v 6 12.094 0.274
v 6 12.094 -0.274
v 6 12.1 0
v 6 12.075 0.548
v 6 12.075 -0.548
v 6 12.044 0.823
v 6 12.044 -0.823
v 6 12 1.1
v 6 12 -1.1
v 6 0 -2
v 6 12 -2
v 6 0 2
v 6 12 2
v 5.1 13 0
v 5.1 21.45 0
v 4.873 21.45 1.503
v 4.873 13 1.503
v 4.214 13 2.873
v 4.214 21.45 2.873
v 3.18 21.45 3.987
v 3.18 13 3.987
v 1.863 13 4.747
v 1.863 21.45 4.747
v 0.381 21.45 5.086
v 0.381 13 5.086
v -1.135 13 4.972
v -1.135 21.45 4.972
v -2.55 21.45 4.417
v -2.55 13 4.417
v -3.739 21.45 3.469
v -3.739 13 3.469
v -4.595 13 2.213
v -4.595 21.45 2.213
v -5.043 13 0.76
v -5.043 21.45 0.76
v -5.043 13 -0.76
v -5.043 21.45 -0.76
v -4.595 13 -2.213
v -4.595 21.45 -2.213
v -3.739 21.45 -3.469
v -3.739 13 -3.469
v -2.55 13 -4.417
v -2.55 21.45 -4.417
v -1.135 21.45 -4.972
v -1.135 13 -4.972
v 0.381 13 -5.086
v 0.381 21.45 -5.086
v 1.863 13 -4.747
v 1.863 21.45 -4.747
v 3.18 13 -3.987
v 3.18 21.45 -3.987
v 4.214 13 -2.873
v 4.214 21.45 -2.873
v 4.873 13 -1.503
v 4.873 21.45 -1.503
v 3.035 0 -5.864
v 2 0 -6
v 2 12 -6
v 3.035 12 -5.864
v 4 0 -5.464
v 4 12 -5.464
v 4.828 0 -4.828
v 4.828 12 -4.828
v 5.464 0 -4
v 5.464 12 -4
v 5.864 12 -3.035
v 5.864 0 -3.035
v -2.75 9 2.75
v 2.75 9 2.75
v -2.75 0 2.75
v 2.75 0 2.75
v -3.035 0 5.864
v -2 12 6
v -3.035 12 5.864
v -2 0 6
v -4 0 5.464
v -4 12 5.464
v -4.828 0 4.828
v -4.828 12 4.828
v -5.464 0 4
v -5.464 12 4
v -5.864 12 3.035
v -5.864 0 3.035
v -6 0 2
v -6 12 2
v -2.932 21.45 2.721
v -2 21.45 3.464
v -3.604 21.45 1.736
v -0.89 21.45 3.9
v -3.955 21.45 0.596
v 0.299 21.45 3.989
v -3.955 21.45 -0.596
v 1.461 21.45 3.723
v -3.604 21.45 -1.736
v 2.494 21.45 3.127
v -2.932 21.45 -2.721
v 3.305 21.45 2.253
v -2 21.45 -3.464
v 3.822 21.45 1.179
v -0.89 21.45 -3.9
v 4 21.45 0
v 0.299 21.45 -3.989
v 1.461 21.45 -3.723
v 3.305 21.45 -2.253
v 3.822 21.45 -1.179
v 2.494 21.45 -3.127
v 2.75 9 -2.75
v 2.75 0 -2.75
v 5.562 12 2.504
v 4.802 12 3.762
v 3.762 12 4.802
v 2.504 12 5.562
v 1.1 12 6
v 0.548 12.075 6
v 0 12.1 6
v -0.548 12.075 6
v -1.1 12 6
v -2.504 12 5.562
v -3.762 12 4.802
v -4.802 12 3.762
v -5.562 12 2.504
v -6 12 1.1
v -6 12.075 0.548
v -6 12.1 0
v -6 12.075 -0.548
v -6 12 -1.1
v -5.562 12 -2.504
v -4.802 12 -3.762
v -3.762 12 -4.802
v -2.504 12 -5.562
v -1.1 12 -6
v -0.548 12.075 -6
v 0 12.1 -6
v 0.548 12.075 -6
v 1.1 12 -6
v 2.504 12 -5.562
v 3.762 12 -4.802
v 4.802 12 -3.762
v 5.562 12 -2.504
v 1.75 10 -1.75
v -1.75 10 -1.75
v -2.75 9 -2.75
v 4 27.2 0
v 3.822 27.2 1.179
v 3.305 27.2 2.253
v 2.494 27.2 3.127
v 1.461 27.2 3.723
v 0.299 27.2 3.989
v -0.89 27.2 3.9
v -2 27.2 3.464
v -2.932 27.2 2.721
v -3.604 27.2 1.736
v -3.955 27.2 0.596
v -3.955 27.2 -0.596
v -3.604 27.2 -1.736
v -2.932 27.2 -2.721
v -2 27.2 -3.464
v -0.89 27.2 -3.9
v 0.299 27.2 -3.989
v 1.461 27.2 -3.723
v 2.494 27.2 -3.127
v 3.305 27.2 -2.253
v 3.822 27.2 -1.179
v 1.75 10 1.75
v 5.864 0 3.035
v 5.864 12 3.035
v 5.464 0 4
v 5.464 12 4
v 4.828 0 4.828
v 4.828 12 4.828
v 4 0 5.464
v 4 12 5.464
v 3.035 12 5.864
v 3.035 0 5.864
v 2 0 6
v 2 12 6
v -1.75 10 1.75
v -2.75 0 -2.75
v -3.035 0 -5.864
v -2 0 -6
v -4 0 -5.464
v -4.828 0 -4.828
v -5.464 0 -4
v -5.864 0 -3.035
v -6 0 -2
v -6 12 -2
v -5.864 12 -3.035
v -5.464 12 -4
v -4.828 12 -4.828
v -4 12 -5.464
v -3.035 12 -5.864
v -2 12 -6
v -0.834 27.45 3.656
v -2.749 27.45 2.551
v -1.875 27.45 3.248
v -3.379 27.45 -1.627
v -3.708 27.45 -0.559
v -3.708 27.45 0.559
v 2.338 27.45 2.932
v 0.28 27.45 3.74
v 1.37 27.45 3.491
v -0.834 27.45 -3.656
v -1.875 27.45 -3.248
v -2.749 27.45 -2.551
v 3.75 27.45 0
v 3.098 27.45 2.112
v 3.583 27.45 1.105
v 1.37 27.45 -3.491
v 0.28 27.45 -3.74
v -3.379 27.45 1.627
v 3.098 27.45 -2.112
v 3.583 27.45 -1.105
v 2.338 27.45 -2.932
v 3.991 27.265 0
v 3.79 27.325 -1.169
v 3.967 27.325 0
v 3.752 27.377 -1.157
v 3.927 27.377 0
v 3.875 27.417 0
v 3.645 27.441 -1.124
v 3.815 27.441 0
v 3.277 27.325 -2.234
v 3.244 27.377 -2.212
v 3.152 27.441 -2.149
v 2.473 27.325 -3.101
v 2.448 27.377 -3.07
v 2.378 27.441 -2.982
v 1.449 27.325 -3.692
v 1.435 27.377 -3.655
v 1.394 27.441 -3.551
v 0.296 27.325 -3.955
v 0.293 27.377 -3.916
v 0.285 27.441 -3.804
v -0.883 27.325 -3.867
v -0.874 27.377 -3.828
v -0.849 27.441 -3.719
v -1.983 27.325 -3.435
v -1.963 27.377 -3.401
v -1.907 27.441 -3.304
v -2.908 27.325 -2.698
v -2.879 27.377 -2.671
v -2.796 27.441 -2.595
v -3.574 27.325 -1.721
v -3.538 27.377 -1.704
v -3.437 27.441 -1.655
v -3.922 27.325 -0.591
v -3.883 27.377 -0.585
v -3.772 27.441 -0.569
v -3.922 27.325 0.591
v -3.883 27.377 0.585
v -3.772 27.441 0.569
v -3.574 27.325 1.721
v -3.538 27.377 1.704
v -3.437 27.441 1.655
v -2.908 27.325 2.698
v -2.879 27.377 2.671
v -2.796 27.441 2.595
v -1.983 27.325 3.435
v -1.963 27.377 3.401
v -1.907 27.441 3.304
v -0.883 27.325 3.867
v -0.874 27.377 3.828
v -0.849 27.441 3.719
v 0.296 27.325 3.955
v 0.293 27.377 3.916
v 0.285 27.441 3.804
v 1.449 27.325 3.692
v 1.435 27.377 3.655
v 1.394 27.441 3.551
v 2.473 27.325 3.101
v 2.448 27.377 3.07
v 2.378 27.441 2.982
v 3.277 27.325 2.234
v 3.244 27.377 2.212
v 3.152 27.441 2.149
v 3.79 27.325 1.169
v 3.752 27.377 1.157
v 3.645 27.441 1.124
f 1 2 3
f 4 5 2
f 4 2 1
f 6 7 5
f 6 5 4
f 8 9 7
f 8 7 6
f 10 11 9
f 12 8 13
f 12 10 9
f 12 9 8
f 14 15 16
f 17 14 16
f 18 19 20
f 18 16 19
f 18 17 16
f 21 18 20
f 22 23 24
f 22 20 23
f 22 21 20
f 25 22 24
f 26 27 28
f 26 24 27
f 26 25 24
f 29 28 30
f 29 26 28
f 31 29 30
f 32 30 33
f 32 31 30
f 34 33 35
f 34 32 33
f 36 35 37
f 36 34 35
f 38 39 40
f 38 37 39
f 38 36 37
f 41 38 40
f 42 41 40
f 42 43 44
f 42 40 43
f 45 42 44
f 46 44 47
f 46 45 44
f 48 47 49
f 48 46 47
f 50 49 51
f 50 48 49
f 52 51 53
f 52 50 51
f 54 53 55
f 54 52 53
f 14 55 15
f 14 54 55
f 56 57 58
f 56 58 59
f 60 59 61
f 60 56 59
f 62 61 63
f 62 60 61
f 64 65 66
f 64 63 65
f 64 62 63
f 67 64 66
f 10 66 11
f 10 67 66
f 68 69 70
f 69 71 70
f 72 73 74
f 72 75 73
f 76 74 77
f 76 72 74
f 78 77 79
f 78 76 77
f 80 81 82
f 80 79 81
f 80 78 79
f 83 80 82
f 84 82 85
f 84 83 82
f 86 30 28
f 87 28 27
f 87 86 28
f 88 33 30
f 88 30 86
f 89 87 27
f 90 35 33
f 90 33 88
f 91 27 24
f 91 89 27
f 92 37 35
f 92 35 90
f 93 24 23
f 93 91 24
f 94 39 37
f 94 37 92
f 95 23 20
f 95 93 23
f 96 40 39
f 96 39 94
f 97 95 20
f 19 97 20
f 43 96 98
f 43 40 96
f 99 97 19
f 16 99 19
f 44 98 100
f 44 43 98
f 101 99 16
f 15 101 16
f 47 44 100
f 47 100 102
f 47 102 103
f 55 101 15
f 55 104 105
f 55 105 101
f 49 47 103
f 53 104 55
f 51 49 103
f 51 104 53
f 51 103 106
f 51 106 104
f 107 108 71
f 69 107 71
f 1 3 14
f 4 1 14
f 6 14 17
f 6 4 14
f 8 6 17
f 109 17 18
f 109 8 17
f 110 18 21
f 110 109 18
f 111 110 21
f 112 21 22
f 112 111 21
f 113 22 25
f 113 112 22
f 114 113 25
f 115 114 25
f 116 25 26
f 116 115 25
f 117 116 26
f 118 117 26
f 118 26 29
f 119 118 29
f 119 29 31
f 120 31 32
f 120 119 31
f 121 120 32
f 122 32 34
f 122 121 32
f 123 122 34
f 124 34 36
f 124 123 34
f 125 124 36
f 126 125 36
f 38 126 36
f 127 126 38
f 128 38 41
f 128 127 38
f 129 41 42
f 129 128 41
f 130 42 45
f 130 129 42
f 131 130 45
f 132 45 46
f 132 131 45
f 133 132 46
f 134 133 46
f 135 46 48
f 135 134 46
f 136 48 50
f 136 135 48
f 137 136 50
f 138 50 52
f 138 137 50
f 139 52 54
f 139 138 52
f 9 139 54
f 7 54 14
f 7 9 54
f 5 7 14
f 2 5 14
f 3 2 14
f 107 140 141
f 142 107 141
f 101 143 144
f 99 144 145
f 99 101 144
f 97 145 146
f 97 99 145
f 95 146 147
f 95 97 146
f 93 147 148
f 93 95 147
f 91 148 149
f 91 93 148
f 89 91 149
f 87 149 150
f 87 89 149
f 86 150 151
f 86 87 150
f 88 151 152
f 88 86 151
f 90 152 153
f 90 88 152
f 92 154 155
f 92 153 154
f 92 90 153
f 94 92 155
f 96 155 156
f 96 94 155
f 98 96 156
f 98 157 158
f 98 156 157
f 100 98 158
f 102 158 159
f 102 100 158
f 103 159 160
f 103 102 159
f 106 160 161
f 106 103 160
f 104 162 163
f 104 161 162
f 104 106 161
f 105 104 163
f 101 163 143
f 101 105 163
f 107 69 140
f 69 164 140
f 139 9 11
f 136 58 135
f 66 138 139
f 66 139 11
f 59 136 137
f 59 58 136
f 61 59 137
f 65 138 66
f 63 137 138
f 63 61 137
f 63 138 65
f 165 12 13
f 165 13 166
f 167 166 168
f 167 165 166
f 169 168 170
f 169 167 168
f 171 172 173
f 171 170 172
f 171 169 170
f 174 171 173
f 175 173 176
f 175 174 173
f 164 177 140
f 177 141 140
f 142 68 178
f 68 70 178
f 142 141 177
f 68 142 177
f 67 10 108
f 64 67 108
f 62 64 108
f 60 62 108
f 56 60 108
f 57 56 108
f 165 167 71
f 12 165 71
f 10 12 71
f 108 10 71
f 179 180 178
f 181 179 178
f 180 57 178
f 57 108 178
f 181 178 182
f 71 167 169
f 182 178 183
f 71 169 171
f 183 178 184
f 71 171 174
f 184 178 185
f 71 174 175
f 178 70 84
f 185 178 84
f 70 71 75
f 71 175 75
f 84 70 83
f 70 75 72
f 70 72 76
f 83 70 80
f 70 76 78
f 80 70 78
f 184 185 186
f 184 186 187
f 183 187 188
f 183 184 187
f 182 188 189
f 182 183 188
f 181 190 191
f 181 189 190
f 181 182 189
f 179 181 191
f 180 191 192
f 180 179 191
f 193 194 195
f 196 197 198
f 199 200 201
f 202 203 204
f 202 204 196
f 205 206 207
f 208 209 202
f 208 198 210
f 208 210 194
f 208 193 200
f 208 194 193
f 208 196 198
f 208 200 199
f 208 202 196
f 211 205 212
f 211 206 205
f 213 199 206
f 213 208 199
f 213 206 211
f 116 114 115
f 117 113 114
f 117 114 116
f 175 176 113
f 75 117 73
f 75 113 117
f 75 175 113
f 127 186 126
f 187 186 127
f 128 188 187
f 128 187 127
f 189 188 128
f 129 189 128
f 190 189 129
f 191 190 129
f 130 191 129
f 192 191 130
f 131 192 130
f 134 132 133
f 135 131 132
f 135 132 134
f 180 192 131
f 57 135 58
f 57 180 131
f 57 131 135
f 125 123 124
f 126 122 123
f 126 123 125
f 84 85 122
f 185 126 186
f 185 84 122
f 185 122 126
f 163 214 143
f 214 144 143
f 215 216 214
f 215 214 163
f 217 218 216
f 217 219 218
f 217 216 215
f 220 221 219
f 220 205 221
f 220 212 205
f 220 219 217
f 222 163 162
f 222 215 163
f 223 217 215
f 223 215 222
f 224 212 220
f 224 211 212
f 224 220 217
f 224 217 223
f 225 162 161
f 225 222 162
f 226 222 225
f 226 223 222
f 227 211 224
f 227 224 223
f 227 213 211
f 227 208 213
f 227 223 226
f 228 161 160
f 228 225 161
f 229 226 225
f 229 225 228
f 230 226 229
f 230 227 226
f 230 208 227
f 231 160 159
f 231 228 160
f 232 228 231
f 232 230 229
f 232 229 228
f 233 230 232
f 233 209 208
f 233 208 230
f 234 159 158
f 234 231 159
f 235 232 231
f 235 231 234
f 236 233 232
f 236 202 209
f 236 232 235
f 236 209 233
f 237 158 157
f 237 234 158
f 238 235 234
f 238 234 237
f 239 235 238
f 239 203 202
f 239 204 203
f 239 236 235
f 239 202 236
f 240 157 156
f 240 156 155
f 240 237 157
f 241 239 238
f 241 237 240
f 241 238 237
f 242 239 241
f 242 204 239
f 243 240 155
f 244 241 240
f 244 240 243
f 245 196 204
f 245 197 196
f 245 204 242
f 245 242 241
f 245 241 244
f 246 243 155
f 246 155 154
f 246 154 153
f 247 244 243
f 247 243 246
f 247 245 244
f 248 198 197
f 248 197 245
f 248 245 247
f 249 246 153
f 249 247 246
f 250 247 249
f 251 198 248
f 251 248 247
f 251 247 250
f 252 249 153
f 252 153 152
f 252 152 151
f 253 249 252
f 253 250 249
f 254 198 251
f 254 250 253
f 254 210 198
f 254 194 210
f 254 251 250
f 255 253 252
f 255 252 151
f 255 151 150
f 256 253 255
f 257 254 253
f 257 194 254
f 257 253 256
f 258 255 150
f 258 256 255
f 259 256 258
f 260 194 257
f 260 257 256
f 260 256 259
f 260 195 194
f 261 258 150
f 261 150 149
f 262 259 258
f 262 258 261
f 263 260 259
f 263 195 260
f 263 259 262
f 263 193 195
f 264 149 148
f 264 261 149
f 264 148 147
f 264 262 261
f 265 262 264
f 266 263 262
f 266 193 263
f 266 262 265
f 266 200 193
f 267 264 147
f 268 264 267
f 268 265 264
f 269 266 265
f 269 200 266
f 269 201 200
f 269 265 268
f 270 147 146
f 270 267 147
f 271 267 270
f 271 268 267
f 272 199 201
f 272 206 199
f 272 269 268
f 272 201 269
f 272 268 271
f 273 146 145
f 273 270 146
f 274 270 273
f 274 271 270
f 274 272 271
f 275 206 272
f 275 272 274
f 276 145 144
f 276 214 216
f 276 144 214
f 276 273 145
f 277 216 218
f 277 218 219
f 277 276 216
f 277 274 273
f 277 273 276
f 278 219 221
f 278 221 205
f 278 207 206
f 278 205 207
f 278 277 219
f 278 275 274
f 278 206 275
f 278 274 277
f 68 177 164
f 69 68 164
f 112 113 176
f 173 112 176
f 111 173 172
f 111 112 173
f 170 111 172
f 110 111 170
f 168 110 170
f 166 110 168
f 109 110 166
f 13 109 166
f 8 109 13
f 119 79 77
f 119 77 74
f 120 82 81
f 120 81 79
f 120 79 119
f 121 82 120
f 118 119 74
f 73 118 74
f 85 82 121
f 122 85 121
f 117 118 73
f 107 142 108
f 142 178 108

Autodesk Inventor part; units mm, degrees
ref_plane "YZ Plane" through (0, 0, 0) normal (1, 0, 0) x (0, 1, 0)
ref_plane "XZ Plane" through (0, 0, 0) normal (0, 1, 0) x (-1, 0, 0)
ref_plane "XY Plane" through (0, 0, 0) normal (0, 0, 1) x (1, 0, 0)
sketch "Szkic1" plane through (0, 0, 0) normal (0, 1, 0) x (-1, 0, 0)
  line L0 (-2.75, 2.75) -> (2.75, 2.75)
  line L1 (2.75, 2.75) -> (2.75, -2.75)
  line L2 (2.75, -2.75) -> (-2.75, -2.75)
  line L3 (-2.75, -2.75) -> (-2.75, 2.75)
  line L4 (-2.75, 2.75) -> (2.75, -2.75) construction
  line L5 (2.75, 2.75) -> (-2.75, -2.75) construction
  line L6 (-2, 6) -> (2, 6)
  line L7 (6, 2) -> (6, -2)
  line L8 (2, -6) -> (-2, -6)
  line L9 (-6, -2) -> (-6, 2)
  line L10 (-6, 6) -> (6, -6) construction
  line L11 (6, 6) -> (-6, -6) construction
  arc A0 (6, 2) -> (2, 6) centre (2, 2) ccw
  arc A1 (2, -6) -> (6, -2) centre (2, -2) ccw
  arc A2 (-6, -2) -> (-2, -6) centre (-2, -2) ccw
  arc A3 (-2, 6) -> (-6, 2) centre (-2, 2) ccw
  point P0 (0, 0)
  dimension "d0" = 5.5
  dimension "d1" = 12
  dimension "d2" = 4
extrude "Wyciągnięcie proste1" add sketch "Szkic1" along normal blind 10
sketch "Szkic2" plane through (0, 10, 0) normal (0, 1, 0) x (1, 0, 0)
  arc A0 (-6, -2) -> (-2, -6) centre (-2, -2) ccw projected
  line L0 (-6, 2) -> (-6, -2) projected
  arc A1 (-2, 6) -> (-6, 2) centre (-2, 2) ccw projected
  line L1 (2, 6) -> (-2, 6) projected
  arc A2 (6, 2) -> (2, 6) centre (2, 2) ccw projected
  line L2 (6, -2) -> (6, 2) projected
  arc A3 (2, -6) -> (6, -2) centre (2, -2) ccw projected
  line L3 (-2, -6) -> (2, -6) projected
extrude "Wyciągnięcie proste2" add sketch "Szkic2" along normal blind 2
sketch "Szkic3" plane through (0, 12, 0) normal (0, 1, 0) x (1, 0, 0)
  circle A0 centre (0, 0) radius 4
  dimension "d7" = 8
extrude "Wyciągnięcie proste3" add sketch "Szkic3" along normal blind 15.45
sketch "Szkic5" plane through (0, 12, 0) normal (0, 1, 0) x (1, 0, 0)
  circle A0 centre (0, 0) radius 5.1
  dimension "d19" = 10.2
extrude "Wyciągnięcie proste4" add sketch "Szkic5" along normal blind 6.15
fillet "Zaokrąglenie2" radius 0.25 1 edges at (-4, 27.45, 0)
chamfer "Faza1" distance 1 angle 45 4 edges at (-2.75, 10, 0) (0, 10, 2.75) (2.75, 10, 0) (0, 10, -2.75)
sketch "Sketch6" plane through (0, 18.15, 0) normal (0, 1, 0) x (1, 0, 0)
  circle A0 centre (0, 0) radius 5.1 projected
  circle A1 centre (0, 0) radius 4 projected
extrude "Extrusion5" add sketch "Sketch6" along normal blind 3.3 contours A0 | A1
chamfer "Chamfer2" distance 1 angle 45 1 edges at (-5.1, 12, 0)
properties part number "CH_01_0020_servo_shaft_1"
